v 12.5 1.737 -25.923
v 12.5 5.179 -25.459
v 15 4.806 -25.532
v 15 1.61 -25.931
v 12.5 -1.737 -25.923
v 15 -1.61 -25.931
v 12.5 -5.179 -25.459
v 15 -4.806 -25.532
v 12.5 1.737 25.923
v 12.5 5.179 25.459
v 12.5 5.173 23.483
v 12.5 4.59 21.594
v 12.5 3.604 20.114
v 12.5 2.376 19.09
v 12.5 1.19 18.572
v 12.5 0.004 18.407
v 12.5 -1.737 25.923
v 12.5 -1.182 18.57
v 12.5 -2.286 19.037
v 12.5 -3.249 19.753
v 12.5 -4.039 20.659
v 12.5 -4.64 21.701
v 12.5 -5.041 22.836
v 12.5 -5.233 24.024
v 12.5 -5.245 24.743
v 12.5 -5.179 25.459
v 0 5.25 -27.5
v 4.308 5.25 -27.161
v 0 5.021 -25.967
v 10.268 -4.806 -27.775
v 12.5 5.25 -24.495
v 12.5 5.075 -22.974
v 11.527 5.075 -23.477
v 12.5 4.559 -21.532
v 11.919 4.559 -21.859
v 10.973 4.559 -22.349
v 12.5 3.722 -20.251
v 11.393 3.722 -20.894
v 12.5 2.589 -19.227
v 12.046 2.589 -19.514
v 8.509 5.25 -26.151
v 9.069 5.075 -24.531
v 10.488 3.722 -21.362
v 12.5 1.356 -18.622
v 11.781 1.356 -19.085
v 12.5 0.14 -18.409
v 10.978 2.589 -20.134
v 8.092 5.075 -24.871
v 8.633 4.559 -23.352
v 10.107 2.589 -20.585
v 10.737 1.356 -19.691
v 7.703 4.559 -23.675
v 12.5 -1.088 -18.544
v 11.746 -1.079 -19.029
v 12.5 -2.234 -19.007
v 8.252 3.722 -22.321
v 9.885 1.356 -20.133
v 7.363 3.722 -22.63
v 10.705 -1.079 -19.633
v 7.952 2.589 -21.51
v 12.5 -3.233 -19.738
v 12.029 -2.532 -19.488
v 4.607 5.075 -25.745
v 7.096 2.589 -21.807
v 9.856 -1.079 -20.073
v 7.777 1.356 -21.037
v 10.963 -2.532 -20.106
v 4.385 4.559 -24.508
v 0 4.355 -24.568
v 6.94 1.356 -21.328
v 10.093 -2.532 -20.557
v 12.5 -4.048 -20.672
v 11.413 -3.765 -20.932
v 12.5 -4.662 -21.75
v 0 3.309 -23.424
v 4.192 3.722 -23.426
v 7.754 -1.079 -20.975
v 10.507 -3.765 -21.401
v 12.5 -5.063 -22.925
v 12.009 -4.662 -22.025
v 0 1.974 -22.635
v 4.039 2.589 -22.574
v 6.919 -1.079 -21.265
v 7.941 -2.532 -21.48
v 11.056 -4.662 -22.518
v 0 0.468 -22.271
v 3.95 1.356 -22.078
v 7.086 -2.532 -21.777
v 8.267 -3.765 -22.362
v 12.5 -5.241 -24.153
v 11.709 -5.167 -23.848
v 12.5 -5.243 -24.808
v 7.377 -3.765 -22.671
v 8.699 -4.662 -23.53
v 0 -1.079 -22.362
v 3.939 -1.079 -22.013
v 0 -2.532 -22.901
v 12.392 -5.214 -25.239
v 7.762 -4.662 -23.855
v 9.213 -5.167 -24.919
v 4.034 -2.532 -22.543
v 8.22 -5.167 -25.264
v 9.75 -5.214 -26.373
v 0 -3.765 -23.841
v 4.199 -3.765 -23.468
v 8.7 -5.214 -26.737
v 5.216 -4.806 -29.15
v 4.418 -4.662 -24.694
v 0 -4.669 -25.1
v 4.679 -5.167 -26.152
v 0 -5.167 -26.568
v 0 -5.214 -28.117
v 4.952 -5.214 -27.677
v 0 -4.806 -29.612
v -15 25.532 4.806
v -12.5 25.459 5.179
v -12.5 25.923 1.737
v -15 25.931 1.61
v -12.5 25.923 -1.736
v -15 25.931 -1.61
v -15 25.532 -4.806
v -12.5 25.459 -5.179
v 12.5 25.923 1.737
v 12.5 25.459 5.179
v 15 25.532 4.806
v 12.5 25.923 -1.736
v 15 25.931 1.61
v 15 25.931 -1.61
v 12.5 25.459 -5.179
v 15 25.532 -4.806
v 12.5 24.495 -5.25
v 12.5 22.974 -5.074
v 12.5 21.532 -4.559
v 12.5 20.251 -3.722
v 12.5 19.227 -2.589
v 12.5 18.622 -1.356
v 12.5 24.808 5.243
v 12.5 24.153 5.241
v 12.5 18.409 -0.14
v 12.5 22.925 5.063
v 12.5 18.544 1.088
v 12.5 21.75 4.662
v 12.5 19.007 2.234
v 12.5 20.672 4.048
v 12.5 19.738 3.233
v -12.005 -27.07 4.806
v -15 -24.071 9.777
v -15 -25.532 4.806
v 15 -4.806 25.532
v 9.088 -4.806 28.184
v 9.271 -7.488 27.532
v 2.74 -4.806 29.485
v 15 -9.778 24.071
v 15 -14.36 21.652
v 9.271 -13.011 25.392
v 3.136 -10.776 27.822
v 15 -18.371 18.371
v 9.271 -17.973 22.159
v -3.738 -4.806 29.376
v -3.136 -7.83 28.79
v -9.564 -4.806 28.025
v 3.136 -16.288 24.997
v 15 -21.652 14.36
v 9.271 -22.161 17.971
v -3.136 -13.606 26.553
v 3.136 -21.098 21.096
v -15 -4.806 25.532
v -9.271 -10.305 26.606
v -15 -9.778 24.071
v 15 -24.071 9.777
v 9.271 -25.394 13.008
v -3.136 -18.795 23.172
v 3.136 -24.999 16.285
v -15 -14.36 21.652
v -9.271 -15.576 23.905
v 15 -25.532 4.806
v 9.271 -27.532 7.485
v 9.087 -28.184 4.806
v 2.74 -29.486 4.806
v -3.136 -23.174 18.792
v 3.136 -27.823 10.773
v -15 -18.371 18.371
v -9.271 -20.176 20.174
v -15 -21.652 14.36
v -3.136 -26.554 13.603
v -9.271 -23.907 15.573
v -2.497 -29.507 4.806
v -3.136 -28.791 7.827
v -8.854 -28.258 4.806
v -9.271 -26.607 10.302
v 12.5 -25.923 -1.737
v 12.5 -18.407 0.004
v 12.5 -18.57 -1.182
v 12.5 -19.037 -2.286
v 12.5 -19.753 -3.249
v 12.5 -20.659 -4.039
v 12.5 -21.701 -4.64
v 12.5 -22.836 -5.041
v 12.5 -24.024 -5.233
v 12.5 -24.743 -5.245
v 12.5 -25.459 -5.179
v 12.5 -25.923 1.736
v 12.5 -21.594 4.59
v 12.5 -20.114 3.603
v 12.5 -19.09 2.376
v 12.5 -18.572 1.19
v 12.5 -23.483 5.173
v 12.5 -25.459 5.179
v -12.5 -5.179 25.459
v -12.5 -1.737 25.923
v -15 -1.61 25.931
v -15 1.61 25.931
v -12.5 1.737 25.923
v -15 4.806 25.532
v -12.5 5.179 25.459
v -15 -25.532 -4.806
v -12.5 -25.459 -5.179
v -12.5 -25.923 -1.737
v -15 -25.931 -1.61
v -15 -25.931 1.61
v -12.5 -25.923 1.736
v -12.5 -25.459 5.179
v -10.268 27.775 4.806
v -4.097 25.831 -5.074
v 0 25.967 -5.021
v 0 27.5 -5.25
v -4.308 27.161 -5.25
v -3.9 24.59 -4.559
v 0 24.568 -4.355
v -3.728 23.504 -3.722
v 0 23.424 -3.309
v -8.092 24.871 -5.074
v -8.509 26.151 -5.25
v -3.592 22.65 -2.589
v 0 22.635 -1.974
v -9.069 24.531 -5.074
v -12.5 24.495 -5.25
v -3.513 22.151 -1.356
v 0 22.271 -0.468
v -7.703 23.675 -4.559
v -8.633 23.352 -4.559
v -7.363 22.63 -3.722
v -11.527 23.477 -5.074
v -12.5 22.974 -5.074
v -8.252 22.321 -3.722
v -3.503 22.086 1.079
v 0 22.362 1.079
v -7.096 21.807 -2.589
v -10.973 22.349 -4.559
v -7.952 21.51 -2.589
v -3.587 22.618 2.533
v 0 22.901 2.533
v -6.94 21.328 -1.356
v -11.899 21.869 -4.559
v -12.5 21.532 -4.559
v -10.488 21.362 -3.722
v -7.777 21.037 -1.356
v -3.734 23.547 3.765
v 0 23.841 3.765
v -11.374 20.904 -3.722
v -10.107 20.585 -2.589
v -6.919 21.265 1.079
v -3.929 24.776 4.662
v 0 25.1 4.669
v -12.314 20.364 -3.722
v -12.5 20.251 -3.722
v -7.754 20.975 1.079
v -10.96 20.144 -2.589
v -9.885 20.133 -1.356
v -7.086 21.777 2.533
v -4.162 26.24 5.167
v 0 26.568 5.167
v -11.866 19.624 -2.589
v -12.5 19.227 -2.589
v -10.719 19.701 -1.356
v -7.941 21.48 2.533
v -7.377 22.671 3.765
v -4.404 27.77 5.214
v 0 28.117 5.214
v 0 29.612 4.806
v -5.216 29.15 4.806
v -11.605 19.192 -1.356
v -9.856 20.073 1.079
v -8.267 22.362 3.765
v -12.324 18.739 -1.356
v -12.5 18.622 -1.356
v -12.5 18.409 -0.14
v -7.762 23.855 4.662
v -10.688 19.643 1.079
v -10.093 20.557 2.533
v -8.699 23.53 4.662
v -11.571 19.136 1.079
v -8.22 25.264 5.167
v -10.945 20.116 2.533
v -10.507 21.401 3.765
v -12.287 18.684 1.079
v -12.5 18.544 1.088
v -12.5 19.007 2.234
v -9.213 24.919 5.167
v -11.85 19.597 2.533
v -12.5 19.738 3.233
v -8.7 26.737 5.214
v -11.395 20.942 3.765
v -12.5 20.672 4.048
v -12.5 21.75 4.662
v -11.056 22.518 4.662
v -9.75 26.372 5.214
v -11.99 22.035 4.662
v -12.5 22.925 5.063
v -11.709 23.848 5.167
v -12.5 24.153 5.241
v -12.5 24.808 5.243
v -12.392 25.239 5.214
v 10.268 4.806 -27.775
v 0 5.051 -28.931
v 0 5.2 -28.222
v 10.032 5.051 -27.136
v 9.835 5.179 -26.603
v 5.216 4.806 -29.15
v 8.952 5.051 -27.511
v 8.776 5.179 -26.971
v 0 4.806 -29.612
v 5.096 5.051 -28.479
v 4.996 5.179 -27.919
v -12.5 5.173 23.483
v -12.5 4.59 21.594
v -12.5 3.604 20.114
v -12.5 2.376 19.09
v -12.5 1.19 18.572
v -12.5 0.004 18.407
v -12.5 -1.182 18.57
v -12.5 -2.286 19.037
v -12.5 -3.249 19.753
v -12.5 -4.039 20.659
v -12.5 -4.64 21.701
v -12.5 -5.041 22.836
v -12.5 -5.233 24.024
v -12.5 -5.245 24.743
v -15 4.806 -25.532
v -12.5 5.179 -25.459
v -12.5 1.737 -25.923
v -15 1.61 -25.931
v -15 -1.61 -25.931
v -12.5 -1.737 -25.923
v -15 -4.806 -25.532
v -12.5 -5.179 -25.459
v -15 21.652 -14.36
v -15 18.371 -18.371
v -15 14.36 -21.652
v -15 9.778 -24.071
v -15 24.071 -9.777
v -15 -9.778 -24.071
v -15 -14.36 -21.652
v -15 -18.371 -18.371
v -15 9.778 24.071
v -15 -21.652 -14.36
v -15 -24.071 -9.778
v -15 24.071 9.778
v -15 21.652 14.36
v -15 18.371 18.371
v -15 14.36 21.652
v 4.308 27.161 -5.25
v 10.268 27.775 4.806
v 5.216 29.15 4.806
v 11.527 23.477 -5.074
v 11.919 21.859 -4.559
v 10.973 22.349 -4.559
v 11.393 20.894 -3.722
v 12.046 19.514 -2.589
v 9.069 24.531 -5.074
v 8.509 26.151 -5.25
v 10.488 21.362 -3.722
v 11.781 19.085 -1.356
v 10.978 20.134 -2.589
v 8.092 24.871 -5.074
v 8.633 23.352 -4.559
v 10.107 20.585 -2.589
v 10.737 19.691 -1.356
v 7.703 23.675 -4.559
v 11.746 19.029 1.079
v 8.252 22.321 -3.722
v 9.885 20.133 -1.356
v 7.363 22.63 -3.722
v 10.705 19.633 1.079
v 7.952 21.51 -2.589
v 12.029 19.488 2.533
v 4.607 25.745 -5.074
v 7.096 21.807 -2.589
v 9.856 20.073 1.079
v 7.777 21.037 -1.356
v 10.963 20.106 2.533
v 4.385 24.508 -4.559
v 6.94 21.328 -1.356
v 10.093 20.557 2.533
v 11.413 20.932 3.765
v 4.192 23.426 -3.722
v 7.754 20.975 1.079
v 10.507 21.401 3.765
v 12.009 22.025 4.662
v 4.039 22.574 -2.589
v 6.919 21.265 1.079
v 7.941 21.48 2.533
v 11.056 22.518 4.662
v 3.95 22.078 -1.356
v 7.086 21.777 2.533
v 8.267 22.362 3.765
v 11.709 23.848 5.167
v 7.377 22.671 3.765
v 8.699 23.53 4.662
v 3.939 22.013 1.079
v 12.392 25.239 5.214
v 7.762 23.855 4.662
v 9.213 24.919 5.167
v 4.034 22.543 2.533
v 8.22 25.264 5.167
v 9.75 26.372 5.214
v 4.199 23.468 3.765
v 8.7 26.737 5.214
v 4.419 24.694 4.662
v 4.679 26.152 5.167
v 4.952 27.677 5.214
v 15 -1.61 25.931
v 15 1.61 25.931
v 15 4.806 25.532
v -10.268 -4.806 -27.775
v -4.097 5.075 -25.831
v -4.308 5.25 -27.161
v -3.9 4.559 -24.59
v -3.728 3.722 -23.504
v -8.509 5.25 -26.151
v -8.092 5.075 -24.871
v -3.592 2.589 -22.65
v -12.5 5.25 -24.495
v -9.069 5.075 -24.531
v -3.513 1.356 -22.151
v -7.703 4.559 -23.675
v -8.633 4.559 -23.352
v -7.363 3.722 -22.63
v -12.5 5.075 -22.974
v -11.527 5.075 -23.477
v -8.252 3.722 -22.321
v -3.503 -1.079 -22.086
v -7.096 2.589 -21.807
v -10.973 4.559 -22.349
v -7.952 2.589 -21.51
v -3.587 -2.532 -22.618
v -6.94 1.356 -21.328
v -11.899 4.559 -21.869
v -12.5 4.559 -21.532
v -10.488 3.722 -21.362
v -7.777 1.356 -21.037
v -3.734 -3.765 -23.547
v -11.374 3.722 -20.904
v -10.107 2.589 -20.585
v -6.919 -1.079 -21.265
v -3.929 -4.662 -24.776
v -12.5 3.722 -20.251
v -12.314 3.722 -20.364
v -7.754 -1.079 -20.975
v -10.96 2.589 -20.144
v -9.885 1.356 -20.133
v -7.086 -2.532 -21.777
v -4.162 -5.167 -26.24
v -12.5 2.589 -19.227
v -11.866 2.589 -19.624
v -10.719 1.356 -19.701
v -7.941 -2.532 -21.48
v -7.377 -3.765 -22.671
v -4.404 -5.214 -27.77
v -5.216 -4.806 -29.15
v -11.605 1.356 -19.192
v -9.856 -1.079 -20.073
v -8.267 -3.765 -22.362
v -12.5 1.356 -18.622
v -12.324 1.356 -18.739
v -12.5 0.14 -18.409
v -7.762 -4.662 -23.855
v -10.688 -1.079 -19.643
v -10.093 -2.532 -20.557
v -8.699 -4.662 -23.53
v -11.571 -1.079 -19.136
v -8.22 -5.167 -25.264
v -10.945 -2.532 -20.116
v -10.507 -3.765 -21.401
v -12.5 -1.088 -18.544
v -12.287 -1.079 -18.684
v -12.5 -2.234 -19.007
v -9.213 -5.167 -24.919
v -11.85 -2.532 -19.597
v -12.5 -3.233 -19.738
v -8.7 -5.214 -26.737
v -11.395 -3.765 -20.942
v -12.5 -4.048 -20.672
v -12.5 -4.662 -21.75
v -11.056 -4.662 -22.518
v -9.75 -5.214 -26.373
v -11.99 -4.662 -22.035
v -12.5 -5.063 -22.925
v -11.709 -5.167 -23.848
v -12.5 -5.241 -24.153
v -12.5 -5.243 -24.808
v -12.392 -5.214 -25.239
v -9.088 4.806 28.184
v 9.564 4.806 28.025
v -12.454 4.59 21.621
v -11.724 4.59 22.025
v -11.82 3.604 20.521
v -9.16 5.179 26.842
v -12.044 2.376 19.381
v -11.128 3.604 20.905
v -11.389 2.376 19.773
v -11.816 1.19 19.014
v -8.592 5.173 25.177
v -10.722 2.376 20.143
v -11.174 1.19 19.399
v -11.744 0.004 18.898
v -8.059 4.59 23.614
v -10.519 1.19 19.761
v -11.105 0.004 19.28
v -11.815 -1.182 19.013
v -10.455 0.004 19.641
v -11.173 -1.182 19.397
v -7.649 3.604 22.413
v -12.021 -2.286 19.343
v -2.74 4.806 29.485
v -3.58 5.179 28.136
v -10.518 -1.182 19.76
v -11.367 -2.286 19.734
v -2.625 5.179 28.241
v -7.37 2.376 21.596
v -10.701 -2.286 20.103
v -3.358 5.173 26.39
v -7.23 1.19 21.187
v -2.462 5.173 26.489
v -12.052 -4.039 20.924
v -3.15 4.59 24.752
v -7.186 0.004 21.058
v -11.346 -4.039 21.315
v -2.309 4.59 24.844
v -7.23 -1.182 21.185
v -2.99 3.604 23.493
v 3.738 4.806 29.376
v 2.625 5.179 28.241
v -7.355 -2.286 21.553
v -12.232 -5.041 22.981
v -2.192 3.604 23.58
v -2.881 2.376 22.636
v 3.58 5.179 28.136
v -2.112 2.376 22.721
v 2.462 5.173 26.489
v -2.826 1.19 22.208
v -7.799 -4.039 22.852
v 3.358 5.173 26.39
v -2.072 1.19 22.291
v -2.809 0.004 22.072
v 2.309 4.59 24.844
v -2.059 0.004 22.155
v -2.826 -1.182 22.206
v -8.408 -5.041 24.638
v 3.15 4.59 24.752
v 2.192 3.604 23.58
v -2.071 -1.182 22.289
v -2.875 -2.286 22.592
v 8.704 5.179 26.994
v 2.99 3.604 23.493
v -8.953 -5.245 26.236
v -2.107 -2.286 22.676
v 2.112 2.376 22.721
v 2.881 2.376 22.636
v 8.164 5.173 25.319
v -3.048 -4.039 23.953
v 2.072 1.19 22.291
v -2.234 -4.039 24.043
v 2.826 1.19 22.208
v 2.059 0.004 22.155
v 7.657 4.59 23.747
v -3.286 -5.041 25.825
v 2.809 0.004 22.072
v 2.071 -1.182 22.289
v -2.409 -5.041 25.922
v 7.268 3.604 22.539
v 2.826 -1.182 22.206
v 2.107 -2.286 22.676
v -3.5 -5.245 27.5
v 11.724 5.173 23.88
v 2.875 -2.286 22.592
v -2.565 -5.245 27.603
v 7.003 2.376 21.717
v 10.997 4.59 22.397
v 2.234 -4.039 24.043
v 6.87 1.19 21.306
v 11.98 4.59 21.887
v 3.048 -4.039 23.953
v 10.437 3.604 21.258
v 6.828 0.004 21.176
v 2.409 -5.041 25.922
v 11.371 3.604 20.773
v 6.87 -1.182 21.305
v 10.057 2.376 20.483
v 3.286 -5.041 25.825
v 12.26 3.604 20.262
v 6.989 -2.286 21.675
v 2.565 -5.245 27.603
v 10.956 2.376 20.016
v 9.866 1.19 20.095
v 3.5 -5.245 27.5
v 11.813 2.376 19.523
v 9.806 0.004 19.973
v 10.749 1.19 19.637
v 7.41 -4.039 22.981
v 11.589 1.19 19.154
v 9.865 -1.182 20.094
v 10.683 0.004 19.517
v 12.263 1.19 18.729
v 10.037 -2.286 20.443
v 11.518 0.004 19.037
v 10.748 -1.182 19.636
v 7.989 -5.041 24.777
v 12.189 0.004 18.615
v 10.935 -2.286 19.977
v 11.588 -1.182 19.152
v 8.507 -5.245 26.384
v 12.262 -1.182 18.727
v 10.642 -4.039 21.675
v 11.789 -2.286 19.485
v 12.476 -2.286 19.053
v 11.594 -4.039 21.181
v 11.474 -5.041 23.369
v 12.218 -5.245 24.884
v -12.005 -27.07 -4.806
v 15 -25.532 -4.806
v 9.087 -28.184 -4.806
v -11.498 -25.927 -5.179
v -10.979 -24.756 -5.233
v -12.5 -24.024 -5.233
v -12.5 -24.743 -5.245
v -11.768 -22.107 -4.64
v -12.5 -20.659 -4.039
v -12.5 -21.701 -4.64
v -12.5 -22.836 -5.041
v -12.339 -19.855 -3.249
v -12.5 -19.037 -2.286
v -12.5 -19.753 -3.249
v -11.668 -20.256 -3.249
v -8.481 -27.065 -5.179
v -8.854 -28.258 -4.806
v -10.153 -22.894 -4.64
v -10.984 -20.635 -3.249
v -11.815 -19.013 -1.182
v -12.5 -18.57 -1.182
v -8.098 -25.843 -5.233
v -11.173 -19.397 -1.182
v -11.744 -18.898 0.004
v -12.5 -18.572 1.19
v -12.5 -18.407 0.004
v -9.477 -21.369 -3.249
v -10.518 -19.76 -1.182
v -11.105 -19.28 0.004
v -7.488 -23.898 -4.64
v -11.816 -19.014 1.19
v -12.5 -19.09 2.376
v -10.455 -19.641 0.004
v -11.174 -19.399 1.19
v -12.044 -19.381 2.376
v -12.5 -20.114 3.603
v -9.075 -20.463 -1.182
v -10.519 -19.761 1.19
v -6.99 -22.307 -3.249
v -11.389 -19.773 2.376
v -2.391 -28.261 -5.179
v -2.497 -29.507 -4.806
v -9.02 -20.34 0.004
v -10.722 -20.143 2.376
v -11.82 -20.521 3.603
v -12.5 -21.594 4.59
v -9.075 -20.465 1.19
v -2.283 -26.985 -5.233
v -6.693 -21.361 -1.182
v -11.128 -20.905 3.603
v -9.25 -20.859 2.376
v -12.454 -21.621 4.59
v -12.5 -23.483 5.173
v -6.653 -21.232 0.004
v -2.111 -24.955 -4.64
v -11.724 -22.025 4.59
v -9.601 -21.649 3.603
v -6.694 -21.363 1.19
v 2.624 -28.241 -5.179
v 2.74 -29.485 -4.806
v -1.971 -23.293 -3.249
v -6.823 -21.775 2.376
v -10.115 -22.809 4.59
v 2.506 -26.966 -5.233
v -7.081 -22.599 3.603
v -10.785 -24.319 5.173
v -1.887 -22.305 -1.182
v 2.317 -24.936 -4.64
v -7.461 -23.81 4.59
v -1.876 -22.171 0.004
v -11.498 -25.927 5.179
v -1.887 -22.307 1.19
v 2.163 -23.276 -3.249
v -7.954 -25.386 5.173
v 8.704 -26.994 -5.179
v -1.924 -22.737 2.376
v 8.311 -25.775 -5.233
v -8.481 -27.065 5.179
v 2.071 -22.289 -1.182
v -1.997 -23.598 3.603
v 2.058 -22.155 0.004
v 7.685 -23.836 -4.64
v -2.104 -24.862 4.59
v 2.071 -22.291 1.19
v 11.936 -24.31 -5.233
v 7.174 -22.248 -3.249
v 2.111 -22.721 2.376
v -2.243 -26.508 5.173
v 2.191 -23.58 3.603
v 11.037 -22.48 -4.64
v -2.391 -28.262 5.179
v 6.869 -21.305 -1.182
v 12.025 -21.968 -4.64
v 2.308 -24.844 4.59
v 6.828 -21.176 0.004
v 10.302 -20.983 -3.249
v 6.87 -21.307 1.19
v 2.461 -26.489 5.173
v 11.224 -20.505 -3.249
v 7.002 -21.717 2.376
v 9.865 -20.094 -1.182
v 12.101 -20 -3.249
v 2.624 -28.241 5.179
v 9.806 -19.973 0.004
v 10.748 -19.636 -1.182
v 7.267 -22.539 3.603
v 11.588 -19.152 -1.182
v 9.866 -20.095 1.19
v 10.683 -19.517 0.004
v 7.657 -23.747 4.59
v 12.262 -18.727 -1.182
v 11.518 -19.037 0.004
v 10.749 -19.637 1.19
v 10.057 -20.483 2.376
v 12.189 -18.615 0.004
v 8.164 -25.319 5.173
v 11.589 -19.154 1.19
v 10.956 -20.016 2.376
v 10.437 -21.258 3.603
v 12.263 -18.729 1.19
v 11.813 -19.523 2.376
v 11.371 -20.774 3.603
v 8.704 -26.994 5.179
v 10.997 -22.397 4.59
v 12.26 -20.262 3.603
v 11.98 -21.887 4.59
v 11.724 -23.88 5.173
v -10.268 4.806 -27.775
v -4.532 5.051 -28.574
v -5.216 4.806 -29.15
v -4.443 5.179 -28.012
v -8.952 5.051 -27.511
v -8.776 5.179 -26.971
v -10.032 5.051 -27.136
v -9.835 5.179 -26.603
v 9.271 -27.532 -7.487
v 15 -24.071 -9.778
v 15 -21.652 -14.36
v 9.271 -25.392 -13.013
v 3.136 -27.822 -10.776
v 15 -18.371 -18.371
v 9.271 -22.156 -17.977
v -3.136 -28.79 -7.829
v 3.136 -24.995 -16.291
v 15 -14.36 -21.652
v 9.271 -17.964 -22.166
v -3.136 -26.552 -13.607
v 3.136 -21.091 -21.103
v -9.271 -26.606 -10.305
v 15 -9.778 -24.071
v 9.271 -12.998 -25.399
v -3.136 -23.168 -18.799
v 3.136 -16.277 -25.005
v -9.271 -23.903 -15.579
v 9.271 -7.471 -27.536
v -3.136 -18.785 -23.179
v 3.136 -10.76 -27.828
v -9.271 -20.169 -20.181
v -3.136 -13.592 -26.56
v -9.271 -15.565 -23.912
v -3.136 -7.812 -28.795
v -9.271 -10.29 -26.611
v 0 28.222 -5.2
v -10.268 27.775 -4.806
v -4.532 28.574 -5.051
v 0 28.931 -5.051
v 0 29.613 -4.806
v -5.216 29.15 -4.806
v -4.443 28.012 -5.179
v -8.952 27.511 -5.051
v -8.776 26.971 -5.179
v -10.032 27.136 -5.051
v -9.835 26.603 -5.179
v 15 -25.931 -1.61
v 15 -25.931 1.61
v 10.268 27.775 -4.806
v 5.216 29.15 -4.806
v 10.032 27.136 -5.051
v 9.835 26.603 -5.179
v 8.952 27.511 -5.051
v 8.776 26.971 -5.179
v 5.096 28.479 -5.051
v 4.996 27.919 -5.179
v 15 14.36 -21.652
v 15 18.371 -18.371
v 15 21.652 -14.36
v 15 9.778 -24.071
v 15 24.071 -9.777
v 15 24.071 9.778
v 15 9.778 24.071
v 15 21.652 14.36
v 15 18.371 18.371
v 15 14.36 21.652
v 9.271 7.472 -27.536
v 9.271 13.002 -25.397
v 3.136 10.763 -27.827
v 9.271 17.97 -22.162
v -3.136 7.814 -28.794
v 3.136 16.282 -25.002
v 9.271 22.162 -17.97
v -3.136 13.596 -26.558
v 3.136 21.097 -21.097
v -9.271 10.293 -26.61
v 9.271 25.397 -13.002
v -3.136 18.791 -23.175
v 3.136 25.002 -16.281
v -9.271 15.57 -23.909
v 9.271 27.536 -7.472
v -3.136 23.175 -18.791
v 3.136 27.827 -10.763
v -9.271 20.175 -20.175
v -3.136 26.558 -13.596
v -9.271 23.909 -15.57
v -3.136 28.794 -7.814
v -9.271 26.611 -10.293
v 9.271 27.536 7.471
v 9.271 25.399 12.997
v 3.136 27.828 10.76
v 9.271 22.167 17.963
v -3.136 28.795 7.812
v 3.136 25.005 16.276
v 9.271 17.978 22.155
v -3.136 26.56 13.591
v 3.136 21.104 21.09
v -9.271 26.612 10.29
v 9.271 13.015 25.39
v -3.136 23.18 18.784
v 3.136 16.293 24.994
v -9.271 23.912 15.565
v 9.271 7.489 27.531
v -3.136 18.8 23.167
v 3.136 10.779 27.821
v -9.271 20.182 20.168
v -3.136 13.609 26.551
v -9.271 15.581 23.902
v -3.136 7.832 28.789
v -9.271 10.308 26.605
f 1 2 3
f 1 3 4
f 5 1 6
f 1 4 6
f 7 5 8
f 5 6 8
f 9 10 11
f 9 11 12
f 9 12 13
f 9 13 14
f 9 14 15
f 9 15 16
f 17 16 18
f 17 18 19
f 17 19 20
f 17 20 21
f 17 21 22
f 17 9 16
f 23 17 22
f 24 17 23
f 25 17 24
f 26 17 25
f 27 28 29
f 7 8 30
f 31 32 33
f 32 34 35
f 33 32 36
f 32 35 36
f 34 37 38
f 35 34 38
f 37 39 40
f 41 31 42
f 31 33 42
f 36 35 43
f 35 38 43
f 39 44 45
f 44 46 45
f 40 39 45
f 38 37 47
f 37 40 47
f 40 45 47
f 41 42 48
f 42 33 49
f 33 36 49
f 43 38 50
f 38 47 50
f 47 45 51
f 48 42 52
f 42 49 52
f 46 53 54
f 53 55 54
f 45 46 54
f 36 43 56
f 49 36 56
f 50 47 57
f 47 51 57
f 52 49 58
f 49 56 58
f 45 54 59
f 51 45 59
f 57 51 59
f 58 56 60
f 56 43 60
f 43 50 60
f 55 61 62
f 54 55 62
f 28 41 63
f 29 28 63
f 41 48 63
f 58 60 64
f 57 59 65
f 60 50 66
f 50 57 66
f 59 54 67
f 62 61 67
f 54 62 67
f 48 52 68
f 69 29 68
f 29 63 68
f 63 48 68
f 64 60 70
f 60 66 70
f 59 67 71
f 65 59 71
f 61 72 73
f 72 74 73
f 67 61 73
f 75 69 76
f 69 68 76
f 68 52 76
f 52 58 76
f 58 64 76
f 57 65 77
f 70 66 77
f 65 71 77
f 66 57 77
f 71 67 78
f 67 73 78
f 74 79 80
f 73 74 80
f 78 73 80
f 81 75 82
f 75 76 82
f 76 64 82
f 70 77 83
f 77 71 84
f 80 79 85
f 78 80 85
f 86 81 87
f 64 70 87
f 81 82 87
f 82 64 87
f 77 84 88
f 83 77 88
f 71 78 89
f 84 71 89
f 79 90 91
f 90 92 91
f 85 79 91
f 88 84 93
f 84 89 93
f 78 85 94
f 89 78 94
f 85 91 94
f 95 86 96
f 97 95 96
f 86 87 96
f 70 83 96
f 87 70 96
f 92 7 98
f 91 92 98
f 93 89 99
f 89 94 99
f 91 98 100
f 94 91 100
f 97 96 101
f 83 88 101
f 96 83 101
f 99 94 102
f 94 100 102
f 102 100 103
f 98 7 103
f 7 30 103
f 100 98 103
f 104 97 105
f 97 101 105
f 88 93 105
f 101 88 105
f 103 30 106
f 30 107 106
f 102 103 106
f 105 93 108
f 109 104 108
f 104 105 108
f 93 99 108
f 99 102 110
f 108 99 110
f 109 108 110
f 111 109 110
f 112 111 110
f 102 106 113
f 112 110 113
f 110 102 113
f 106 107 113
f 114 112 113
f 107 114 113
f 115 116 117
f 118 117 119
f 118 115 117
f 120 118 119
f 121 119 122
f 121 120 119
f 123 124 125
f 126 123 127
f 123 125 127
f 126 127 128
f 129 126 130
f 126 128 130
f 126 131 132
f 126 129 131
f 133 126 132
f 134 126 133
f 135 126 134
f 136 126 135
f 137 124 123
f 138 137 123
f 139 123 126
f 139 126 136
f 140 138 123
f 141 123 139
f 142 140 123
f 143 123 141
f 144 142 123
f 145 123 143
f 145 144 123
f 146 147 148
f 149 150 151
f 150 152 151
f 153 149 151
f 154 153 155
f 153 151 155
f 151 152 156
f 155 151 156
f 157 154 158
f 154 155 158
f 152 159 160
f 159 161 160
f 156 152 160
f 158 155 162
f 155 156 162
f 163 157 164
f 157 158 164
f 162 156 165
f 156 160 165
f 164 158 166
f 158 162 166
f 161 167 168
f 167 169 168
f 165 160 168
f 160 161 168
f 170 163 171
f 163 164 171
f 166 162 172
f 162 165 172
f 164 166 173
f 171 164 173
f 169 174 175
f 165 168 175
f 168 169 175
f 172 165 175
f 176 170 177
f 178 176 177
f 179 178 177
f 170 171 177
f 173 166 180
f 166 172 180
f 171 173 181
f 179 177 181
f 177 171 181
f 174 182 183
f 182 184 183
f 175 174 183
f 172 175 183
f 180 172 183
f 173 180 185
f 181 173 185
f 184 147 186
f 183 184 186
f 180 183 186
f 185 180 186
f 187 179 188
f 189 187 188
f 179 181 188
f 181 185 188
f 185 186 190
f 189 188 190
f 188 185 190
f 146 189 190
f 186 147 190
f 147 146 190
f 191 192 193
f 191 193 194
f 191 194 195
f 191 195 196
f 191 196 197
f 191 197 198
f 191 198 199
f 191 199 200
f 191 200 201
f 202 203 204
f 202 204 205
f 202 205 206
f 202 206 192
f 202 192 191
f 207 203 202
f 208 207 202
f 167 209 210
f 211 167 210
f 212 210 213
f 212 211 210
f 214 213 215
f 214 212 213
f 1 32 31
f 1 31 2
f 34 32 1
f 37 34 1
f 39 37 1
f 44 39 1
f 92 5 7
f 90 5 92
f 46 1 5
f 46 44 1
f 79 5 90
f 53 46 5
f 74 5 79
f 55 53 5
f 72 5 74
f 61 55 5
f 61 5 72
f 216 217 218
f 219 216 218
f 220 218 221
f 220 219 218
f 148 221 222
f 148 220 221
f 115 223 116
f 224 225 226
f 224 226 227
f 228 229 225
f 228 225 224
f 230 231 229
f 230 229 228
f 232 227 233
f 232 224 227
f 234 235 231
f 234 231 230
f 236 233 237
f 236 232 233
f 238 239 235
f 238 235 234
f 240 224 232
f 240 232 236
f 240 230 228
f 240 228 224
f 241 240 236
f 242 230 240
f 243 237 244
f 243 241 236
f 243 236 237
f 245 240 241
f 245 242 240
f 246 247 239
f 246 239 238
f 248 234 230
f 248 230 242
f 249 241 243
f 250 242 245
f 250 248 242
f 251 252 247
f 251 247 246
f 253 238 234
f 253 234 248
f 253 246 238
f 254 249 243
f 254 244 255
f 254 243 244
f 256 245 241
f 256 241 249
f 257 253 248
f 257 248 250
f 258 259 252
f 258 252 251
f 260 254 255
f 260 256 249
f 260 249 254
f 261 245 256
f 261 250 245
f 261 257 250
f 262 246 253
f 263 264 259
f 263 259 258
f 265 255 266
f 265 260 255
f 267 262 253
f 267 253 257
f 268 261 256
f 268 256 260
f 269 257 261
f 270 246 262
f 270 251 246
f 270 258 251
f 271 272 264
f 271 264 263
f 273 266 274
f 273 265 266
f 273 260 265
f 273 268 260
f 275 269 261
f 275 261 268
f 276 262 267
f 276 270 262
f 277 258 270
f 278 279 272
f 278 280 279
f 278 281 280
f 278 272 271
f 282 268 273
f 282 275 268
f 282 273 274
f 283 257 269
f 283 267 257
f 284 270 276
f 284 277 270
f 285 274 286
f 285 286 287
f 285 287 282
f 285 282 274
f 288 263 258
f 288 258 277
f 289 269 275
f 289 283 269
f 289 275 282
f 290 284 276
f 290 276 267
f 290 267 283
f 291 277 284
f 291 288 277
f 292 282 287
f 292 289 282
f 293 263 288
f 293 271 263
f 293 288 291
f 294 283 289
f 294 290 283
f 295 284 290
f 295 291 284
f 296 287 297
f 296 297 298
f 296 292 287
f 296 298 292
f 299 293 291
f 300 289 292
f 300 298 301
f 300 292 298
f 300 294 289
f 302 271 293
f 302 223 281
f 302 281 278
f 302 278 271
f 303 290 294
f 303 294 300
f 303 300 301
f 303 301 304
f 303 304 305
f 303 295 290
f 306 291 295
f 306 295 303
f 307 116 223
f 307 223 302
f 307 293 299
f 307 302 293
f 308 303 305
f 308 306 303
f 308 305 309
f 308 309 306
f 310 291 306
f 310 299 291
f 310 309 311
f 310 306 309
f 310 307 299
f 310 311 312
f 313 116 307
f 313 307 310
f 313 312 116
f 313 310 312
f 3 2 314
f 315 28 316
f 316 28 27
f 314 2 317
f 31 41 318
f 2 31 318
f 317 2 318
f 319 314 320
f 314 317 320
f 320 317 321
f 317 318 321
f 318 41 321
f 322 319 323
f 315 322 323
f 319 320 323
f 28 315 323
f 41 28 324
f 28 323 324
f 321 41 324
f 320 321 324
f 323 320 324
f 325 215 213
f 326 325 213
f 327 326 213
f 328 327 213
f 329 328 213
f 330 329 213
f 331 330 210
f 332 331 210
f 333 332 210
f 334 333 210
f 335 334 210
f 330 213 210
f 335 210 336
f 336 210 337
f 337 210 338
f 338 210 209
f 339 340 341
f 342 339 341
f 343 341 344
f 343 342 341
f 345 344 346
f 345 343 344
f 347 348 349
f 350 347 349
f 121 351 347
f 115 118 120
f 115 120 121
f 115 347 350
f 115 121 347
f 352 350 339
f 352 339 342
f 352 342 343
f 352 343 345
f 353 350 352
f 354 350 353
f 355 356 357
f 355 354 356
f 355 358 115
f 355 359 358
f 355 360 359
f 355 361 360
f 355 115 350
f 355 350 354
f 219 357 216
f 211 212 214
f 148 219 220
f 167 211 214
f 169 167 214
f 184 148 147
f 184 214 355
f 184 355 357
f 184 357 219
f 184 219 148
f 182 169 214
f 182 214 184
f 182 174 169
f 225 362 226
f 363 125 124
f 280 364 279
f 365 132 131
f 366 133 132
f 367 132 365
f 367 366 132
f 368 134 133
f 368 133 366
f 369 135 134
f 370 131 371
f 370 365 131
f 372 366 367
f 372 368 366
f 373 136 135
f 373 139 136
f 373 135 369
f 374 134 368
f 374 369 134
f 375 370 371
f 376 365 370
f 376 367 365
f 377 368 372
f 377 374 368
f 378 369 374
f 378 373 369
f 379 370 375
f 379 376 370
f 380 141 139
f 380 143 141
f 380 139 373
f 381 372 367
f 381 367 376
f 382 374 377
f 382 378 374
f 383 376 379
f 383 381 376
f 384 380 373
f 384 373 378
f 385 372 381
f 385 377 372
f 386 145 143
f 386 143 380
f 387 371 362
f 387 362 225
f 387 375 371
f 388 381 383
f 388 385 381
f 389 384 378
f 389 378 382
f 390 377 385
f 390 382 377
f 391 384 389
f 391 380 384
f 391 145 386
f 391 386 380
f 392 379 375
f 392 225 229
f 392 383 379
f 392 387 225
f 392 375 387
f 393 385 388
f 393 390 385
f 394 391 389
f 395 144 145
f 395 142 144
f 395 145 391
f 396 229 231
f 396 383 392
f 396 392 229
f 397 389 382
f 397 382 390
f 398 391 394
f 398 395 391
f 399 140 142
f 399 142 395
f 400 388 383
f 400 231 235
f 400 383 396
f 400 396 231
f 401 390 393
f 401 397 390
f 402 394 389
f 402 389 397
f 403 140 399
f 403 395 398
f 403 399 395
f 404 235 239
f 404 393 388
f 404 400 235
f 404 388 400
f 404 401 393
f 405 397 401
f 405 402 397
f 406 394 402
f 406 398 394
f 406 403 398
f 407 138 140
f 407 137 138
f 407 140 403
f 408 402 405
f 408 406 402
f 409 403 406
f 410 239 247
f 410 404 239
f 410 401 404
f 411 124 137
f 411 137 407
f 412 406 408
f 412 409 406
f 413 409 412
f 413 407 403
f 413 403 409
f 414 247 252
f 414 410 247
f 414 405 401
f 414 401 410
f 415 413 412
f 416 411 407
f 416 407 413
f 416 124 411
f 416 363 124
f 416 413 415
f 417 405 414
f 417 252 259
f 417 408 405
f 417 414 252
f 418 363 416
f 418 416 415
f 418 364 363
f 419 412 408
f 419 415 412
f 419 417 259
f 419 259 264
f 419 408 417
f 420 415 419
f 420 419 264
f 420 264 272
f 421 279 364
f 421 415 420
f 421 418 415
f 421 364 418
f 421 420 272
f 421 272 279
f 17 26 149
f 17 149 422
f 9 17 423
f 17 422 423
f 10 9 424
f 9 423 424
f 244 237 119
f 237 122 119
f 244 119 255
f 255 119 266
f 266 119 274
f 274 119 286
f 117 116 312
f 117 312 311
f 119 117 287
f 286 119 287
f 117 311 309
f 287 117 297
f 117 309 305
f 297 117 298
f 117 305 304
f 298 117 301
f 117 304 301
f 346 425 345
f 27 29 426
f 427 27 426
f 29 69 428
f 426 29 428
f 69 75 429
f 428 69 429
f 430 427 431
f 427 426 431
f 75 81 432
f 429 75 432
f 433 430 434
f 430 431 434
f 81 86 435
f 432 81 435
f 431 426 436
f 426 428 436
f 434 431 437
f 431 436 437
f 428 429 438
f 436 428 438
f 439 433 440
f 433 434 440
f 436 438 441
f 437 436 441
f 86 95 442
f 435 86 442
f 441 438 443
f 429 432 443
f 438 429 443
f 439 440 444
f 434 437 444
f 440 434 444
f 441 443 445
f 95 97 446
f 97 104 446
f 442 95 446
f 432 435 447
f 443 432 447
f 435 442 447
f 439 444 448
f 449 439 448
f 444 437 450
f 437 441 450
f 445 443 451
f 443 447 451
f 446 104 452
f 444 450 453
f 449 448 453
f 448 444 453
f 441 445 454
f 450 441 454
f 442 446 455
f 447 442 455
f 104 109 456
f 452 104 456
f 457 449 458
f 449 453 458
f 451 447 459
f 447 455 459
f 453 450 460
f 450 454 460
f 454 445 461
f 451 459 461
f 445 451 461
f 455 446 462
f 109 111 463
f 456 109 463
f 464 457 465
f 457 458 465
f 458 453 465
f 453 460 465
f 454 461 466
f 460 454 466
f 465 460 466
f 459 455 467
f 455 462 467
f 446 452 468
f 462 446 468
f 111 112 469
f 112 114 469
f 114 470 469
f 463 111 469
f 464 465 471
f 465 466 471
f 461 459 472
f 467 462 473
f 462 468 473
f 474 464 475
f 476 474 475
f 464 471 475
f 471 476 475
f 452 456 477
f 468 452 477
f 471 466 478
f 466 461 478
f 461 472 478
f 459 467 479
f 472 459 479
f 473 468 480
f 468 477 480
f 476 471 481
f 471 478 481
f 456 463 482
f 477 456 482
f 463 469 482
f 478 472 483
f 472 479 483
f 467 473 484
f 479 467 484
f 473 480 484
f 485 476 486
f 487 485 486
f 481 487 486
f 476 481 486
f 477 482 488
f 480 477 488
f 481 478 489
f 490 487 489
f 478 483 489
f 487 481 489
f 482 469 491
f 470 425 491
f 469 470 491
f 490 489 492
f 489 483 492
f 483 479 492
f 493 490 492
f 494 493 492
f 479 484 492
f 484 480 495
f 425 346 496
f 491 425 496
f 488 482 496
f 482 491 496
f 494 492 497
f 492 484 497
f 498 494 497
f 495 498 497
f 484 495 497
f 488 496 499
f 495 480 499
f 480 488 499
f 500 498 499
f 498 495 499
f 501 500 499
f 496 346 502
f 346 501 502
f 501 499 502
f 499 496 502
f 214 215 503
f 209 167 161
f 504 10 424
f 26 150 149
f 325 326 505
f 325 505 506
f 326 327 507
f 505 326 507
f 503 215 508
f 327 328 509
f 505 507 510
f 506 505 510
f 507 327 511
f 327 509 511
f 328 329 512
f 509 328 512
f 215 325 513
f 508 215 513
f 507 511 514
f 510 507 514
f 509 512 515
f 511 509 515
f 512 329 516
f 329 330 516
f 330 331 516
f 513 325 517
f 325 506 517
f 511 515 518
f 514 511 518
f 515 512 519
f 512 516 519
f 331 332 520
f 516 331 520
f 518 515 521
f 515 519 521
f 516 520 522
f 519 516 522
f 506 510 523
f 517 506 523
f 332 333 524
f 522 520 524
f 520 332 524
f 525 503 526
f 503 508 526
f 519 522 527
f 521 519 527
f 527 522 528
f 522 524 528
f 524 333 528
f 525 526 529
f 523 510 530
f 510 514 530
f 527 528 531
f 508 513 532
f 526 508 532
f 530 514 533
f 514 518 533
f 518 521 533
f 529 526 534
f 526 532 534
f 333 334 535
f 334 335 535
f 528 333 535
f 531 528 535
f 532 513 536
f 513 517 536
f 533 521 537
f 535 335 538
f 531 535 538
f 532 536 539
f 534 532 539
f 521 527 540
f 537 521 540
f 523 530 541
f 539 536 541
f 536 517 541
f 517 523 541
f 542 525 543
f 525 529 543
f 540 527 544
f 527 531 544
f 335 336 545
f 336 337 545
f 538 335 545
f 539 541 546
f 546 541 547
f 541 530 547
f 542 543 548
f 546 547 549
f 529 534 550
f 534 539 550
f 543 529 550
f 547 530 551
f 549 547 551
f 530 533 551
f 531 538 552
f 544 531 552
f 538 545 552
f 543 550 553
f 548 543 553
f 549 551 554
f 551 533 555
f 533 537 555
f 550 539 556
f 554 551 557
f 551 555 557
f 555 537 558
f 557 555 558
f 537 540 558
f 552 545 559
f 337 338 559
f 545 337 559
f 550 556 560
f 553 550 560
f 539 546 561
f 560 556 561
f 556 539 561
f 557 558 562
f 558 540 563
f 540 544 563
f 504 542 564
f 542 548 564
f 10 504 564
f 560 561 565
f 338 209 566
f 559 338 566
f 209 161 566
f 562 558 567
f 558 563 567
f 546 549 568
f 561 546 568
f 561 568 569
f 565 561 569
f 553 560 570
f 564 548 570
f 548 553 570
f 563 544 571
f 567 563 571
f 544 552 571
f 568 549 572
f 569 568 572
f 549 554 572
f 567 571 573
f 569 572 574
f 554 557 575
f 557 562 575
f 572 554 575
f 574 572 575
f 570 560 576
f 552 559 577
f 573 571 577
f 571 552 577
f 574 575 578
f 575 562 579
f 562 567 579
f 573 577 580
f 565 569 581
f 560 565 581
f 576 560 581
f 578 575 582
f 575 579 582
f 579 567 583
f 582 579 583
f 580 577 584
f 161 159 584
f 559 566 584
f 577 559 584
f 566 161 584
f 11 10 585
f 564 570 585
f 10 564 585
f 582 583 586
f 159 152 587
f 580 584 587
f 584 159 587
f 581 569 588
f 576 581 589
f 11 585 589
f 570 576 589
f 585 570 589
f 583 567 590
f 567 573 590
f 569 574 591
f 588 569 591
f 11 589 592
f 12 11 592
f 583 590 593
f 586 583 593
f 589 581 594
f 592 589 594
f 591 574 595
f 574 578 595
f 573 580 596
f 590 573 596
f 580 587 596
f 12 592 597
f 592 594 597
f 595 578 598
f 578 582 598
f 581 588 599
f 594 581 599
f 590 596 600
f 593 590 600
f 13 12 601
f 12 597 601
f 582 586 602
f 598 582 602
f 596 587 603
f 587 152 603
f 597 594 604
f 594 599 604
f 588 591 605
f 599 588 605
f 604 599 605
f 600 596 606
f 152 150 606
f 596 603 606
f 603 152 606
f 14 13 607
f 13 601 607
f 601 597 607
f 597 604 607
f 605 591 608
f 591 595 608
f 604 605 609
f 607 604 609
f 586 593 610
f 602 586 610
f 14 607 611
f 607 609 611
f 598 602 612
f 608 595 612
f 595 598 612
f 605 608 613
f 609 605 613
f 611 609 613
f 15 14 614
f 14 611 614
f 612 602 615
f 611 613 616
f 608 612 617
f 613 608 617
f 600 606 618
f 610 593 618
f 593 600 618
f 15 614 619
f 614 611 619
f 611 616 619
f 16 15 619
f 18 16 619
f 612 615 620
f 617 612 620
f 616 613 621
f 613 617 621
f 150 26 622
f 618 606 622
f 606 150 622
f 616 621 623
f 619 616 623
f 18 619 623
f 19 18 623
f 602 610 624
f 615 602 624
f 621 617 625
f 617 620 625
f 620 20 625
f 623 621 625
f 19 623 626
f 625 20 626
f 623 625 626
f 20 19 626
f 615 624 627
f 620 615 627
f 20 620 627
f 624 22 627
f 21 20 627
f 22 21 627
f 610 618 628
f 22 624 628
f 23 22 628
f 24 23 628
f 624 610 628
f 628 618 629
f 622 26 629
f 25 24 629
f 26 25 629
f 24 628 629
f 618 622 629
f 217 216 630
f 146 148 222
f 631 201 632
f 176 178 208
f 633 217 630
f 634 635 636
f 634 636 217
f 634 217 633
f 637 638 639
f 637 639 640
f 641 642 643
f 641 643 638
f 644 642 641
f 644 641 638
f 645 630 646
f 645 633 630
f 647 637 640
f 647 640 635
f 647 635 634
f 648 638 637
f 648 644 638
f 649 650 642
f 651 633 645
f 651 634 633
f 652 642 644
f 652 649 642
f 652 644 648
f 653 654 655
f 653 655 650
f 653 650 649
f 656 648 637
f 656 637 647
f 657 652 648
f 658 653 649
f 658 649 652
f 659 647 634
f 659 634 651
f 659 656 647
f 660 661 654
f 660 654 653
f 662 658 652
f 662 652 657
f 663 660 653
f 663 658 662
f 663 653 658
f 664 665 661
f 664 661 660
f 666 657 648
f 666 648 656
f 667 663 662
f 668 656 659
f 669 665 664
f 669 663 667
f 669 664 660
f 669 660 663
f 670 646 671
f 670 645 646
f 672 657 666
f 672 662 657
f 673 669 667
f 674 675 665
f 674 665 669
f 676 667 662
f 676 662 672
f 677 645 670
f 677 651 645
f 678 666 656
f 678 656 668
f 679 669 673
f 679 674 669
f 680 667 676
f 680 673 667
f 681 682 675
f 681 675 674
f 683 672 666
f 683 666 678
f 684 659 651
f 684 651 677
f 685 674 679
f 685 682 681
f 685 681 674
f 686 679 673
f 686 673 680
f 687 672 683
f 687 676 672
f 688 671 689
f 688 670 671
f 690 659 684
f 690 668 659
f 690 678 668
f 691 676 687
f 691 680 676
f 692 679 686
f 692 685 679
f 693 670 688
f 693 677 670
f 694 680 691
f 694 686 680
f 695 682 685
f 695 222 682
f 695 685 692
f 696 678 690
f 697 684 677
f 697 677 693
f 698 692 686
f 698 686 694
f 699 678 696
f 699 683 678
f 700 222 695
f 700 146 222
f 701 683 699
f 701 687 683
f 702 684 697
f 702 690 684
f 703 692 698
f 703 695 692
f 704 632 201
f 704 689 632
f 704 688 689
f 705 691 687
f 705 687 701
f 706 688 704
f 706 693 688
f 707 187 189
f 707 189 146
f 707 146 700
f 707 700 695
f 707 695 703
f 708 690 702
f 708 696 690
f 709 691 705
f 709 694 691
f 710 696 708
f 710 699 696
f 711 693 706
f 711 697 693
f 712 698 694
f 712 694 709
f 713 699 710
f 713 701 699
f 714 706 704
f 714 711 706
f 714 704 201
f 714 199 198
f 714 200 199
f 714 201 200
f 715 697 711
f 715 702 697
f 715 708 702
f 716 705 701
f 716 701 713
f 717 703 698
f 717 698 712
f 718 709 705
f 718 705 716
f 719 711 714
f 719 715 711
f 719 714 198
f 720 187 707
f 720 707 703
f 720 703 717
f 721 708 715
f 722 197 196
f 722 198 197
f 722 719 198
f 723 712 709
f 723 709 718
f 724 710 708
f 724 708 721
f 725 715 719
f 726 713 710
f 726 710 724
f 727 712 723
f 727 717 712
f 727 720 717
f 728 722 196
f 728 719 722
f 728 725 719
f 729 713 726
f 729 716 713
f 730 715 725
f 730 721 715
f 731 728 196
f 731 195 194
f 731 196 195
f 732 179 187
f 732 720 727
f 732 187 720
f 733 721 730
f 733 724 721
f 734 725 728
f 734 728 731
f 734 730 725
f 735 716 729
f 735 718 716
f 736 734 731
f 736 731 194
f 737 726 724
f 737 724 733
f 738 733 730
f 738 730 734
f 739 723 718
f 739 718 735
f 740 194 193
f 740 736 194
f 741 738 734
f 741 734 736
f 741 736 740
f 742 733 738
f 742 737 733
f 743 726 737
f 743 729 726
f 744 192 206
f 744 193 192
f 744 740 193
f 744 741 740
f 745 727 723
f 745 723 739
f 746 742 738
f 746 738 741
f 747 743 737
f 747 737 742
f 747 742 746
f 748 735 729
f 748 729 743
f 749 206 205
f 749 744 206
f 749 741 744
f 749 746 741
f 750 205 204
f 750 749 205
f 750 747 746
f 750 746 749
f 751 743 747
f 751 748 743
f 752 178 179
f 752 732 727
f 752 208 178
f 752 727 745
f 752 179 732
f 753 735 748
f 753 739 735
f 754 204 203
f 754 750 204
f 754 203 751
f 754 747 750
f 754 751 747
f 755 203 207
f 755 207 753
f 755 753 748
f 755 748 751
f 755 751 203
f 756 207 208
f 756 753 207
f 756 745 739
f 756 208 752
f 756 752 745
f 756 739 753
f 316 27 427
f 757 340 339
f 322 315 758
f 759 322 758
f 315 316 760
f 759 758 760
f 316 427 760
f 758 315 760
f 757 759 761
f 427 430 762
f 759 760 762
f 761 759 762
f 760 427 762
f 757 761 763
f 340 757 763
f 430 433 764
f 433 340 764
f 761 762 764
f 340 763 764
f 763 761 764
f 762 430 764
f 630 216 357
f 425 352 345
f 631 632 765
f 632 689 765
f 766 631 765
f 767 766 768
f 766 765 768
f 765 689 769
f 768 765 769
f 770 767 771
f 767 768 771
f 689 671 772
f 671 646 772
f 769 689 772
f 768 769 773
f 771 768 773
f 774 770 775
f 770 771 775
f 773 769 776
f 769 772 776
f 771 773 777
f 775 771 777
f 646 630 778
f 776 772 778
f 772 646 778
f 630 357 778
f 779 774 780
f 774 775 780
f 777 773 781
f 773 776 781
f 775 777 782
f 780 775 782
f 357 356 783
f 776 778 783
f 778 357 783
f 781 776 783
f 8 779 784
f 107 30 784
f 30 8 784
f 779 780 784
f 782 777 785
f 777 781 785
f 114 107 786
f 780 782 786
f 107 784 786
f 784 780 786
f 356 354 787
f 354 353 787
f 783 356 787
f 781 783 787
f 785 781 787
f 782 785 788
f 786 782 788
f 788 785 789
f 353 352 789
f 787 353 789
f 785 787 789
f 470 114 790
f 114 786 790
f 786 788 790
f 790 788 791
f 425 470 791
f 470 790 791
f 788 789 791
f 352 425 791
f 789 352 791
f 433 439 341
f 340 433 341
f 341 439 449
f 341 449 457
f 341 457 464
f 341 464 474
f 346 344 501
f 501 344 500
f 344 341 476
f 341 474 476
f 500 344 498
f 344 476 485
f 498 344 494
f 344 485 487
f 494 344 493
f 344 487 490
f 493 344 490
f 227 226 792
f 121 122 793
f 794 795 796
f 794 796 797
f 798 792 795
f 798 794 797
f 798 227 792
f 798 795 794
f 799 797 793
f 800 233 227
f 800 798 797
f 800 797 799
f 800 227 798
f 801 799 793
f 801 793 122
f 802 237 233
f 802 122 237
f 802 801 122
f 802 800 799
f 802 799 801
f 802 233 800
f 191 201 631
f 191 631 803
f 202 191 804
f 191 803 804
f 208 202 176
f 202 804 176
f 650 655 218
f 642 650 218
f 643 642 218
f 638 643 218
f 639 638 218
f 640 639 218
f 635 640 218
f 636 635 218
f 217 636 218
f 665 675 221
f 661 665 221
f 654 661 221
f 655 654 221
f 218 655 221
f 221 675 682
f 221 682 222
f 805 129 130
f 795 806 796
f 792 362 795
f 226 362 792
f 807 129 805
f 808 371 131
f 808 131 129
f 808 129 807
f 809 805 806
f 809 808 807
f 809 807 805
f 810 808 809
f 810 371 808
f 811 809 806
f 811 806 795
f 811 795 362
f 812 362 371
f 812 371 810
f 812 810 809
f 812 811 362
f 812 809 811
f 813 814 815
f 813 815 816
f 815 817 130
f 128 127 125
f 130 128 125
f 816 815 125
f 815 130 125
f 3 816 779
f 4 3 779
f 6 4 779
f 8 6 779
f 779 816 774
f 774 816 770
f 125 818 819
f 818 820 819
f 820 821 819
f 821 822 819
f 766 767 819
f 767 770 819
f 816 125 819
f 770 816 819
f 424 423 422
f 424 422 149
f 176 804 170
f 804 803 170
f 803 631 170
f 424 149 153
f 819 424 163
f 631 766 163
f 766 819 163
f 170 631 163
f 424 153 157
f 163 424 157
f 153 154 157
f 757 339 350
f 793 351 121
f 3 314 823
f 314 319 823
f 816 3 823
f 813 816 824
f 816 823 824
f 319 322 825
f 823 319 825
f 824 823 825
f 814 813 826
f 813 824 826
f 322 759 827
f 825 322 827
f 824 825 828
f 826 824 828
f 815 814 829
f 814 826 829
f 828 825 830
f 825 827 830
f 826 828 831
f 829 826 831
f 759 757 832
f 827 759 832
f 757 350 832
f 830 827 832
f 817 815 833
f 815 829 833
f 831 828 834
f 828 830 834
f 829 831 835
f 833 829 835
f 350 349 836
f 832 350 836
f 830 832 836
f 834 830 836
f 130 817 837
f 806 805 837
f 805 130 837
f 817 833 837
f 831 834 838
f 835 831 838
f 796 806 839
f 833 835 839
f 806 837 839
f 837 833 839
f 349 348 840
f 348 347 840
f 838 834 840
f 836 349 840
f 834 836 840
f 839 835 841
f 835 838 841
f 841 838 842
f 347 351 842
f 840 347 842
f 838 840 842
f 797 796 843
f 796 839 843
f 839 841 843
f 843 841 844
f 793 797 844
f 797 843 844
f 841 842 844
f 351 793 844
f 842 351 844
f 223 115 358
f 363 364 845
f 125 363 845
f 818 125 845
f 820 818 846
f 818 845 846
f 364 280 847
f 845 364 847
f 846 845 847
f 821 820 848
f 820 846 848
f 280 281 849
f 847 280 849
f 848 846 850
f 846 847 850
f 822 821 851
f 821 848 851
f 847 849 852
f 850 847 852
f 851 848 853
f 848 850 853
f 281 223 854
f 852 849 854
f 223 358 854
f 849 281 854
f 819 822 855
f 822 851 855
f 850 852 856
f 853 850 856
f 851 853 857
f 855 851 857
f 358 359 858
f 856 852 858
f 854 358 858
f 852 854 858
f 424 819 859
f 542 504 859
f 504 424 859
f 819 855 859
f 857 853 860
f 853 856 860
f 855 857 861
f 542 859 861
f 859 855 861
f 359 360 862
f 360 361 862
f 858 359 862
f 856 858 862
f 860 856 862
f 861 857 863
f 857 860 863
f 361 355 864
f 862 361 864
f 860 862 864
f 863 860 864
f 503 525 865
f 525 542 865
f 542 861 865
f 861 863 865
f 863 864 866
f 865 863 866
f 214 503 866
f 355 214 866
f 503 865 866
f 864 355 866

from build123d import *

# Parameters (mm, degrees)
F2_R     = 5.25
F4_R     = 25.9807621135
F5_DEPTH = 2.5


# Not quite as in the source:
# - a pattern or mirror of a feature is missing from the dataset's text; its kind, count and spacing are read off the source's solid


with BuildPart() as f1:
    # F0 (on Front) → F1 (revolve)
    with BuildSketch(Plane.XZ):
        with BuildLine():
            Line((-15, 25.9807621135), (-15, 0))
            Line((-15, 0), (15, 0))
            Line((15, 0), (15, 25.9807621135))
            ThreePointArc((15, 25.9807621135), (0, 30), (-15, 25.9807621135))
        make_face()
    revolve(axis=Axis((0, 0, 0), (1, 0, 0)))

    # F2 (on Right) → F3 (revolve, cut)
    with BuildSketch(Plane.YZ):
        with Locations((0, -27.5)):
            Circle(F2_R)
    f3 = revolve(axis=Axis((0, 15, 0), (0, 1, 0)), mode=Mode.SUBTRACT)

    # F3_copies: F3 across plane
    add(f3.mirror(Plane(origin=(0, -1e-06, -1e-06), x_dir=(0, -0.7071084838, 0.7071050786), z_dir=(0, -0.7071050786, -0.7071084838))), mode=Mode.SUBTRACT)

    # F4 (on face) → F5 (join)
    with BuildSketch(Plane(origin=(-15, 0, 0), x_dir=(0, -1, 0), z_dir=(-1, 0, 0))):
        Circle(F4_R)
    extrude(amount=-F5_DEPTH)

    # F6: F1 across plane


with BuildPart() as f1_1:
    add(f1.part)
    add(f1.part.mirror(Plane.YZ))


solid = f1_1.part
